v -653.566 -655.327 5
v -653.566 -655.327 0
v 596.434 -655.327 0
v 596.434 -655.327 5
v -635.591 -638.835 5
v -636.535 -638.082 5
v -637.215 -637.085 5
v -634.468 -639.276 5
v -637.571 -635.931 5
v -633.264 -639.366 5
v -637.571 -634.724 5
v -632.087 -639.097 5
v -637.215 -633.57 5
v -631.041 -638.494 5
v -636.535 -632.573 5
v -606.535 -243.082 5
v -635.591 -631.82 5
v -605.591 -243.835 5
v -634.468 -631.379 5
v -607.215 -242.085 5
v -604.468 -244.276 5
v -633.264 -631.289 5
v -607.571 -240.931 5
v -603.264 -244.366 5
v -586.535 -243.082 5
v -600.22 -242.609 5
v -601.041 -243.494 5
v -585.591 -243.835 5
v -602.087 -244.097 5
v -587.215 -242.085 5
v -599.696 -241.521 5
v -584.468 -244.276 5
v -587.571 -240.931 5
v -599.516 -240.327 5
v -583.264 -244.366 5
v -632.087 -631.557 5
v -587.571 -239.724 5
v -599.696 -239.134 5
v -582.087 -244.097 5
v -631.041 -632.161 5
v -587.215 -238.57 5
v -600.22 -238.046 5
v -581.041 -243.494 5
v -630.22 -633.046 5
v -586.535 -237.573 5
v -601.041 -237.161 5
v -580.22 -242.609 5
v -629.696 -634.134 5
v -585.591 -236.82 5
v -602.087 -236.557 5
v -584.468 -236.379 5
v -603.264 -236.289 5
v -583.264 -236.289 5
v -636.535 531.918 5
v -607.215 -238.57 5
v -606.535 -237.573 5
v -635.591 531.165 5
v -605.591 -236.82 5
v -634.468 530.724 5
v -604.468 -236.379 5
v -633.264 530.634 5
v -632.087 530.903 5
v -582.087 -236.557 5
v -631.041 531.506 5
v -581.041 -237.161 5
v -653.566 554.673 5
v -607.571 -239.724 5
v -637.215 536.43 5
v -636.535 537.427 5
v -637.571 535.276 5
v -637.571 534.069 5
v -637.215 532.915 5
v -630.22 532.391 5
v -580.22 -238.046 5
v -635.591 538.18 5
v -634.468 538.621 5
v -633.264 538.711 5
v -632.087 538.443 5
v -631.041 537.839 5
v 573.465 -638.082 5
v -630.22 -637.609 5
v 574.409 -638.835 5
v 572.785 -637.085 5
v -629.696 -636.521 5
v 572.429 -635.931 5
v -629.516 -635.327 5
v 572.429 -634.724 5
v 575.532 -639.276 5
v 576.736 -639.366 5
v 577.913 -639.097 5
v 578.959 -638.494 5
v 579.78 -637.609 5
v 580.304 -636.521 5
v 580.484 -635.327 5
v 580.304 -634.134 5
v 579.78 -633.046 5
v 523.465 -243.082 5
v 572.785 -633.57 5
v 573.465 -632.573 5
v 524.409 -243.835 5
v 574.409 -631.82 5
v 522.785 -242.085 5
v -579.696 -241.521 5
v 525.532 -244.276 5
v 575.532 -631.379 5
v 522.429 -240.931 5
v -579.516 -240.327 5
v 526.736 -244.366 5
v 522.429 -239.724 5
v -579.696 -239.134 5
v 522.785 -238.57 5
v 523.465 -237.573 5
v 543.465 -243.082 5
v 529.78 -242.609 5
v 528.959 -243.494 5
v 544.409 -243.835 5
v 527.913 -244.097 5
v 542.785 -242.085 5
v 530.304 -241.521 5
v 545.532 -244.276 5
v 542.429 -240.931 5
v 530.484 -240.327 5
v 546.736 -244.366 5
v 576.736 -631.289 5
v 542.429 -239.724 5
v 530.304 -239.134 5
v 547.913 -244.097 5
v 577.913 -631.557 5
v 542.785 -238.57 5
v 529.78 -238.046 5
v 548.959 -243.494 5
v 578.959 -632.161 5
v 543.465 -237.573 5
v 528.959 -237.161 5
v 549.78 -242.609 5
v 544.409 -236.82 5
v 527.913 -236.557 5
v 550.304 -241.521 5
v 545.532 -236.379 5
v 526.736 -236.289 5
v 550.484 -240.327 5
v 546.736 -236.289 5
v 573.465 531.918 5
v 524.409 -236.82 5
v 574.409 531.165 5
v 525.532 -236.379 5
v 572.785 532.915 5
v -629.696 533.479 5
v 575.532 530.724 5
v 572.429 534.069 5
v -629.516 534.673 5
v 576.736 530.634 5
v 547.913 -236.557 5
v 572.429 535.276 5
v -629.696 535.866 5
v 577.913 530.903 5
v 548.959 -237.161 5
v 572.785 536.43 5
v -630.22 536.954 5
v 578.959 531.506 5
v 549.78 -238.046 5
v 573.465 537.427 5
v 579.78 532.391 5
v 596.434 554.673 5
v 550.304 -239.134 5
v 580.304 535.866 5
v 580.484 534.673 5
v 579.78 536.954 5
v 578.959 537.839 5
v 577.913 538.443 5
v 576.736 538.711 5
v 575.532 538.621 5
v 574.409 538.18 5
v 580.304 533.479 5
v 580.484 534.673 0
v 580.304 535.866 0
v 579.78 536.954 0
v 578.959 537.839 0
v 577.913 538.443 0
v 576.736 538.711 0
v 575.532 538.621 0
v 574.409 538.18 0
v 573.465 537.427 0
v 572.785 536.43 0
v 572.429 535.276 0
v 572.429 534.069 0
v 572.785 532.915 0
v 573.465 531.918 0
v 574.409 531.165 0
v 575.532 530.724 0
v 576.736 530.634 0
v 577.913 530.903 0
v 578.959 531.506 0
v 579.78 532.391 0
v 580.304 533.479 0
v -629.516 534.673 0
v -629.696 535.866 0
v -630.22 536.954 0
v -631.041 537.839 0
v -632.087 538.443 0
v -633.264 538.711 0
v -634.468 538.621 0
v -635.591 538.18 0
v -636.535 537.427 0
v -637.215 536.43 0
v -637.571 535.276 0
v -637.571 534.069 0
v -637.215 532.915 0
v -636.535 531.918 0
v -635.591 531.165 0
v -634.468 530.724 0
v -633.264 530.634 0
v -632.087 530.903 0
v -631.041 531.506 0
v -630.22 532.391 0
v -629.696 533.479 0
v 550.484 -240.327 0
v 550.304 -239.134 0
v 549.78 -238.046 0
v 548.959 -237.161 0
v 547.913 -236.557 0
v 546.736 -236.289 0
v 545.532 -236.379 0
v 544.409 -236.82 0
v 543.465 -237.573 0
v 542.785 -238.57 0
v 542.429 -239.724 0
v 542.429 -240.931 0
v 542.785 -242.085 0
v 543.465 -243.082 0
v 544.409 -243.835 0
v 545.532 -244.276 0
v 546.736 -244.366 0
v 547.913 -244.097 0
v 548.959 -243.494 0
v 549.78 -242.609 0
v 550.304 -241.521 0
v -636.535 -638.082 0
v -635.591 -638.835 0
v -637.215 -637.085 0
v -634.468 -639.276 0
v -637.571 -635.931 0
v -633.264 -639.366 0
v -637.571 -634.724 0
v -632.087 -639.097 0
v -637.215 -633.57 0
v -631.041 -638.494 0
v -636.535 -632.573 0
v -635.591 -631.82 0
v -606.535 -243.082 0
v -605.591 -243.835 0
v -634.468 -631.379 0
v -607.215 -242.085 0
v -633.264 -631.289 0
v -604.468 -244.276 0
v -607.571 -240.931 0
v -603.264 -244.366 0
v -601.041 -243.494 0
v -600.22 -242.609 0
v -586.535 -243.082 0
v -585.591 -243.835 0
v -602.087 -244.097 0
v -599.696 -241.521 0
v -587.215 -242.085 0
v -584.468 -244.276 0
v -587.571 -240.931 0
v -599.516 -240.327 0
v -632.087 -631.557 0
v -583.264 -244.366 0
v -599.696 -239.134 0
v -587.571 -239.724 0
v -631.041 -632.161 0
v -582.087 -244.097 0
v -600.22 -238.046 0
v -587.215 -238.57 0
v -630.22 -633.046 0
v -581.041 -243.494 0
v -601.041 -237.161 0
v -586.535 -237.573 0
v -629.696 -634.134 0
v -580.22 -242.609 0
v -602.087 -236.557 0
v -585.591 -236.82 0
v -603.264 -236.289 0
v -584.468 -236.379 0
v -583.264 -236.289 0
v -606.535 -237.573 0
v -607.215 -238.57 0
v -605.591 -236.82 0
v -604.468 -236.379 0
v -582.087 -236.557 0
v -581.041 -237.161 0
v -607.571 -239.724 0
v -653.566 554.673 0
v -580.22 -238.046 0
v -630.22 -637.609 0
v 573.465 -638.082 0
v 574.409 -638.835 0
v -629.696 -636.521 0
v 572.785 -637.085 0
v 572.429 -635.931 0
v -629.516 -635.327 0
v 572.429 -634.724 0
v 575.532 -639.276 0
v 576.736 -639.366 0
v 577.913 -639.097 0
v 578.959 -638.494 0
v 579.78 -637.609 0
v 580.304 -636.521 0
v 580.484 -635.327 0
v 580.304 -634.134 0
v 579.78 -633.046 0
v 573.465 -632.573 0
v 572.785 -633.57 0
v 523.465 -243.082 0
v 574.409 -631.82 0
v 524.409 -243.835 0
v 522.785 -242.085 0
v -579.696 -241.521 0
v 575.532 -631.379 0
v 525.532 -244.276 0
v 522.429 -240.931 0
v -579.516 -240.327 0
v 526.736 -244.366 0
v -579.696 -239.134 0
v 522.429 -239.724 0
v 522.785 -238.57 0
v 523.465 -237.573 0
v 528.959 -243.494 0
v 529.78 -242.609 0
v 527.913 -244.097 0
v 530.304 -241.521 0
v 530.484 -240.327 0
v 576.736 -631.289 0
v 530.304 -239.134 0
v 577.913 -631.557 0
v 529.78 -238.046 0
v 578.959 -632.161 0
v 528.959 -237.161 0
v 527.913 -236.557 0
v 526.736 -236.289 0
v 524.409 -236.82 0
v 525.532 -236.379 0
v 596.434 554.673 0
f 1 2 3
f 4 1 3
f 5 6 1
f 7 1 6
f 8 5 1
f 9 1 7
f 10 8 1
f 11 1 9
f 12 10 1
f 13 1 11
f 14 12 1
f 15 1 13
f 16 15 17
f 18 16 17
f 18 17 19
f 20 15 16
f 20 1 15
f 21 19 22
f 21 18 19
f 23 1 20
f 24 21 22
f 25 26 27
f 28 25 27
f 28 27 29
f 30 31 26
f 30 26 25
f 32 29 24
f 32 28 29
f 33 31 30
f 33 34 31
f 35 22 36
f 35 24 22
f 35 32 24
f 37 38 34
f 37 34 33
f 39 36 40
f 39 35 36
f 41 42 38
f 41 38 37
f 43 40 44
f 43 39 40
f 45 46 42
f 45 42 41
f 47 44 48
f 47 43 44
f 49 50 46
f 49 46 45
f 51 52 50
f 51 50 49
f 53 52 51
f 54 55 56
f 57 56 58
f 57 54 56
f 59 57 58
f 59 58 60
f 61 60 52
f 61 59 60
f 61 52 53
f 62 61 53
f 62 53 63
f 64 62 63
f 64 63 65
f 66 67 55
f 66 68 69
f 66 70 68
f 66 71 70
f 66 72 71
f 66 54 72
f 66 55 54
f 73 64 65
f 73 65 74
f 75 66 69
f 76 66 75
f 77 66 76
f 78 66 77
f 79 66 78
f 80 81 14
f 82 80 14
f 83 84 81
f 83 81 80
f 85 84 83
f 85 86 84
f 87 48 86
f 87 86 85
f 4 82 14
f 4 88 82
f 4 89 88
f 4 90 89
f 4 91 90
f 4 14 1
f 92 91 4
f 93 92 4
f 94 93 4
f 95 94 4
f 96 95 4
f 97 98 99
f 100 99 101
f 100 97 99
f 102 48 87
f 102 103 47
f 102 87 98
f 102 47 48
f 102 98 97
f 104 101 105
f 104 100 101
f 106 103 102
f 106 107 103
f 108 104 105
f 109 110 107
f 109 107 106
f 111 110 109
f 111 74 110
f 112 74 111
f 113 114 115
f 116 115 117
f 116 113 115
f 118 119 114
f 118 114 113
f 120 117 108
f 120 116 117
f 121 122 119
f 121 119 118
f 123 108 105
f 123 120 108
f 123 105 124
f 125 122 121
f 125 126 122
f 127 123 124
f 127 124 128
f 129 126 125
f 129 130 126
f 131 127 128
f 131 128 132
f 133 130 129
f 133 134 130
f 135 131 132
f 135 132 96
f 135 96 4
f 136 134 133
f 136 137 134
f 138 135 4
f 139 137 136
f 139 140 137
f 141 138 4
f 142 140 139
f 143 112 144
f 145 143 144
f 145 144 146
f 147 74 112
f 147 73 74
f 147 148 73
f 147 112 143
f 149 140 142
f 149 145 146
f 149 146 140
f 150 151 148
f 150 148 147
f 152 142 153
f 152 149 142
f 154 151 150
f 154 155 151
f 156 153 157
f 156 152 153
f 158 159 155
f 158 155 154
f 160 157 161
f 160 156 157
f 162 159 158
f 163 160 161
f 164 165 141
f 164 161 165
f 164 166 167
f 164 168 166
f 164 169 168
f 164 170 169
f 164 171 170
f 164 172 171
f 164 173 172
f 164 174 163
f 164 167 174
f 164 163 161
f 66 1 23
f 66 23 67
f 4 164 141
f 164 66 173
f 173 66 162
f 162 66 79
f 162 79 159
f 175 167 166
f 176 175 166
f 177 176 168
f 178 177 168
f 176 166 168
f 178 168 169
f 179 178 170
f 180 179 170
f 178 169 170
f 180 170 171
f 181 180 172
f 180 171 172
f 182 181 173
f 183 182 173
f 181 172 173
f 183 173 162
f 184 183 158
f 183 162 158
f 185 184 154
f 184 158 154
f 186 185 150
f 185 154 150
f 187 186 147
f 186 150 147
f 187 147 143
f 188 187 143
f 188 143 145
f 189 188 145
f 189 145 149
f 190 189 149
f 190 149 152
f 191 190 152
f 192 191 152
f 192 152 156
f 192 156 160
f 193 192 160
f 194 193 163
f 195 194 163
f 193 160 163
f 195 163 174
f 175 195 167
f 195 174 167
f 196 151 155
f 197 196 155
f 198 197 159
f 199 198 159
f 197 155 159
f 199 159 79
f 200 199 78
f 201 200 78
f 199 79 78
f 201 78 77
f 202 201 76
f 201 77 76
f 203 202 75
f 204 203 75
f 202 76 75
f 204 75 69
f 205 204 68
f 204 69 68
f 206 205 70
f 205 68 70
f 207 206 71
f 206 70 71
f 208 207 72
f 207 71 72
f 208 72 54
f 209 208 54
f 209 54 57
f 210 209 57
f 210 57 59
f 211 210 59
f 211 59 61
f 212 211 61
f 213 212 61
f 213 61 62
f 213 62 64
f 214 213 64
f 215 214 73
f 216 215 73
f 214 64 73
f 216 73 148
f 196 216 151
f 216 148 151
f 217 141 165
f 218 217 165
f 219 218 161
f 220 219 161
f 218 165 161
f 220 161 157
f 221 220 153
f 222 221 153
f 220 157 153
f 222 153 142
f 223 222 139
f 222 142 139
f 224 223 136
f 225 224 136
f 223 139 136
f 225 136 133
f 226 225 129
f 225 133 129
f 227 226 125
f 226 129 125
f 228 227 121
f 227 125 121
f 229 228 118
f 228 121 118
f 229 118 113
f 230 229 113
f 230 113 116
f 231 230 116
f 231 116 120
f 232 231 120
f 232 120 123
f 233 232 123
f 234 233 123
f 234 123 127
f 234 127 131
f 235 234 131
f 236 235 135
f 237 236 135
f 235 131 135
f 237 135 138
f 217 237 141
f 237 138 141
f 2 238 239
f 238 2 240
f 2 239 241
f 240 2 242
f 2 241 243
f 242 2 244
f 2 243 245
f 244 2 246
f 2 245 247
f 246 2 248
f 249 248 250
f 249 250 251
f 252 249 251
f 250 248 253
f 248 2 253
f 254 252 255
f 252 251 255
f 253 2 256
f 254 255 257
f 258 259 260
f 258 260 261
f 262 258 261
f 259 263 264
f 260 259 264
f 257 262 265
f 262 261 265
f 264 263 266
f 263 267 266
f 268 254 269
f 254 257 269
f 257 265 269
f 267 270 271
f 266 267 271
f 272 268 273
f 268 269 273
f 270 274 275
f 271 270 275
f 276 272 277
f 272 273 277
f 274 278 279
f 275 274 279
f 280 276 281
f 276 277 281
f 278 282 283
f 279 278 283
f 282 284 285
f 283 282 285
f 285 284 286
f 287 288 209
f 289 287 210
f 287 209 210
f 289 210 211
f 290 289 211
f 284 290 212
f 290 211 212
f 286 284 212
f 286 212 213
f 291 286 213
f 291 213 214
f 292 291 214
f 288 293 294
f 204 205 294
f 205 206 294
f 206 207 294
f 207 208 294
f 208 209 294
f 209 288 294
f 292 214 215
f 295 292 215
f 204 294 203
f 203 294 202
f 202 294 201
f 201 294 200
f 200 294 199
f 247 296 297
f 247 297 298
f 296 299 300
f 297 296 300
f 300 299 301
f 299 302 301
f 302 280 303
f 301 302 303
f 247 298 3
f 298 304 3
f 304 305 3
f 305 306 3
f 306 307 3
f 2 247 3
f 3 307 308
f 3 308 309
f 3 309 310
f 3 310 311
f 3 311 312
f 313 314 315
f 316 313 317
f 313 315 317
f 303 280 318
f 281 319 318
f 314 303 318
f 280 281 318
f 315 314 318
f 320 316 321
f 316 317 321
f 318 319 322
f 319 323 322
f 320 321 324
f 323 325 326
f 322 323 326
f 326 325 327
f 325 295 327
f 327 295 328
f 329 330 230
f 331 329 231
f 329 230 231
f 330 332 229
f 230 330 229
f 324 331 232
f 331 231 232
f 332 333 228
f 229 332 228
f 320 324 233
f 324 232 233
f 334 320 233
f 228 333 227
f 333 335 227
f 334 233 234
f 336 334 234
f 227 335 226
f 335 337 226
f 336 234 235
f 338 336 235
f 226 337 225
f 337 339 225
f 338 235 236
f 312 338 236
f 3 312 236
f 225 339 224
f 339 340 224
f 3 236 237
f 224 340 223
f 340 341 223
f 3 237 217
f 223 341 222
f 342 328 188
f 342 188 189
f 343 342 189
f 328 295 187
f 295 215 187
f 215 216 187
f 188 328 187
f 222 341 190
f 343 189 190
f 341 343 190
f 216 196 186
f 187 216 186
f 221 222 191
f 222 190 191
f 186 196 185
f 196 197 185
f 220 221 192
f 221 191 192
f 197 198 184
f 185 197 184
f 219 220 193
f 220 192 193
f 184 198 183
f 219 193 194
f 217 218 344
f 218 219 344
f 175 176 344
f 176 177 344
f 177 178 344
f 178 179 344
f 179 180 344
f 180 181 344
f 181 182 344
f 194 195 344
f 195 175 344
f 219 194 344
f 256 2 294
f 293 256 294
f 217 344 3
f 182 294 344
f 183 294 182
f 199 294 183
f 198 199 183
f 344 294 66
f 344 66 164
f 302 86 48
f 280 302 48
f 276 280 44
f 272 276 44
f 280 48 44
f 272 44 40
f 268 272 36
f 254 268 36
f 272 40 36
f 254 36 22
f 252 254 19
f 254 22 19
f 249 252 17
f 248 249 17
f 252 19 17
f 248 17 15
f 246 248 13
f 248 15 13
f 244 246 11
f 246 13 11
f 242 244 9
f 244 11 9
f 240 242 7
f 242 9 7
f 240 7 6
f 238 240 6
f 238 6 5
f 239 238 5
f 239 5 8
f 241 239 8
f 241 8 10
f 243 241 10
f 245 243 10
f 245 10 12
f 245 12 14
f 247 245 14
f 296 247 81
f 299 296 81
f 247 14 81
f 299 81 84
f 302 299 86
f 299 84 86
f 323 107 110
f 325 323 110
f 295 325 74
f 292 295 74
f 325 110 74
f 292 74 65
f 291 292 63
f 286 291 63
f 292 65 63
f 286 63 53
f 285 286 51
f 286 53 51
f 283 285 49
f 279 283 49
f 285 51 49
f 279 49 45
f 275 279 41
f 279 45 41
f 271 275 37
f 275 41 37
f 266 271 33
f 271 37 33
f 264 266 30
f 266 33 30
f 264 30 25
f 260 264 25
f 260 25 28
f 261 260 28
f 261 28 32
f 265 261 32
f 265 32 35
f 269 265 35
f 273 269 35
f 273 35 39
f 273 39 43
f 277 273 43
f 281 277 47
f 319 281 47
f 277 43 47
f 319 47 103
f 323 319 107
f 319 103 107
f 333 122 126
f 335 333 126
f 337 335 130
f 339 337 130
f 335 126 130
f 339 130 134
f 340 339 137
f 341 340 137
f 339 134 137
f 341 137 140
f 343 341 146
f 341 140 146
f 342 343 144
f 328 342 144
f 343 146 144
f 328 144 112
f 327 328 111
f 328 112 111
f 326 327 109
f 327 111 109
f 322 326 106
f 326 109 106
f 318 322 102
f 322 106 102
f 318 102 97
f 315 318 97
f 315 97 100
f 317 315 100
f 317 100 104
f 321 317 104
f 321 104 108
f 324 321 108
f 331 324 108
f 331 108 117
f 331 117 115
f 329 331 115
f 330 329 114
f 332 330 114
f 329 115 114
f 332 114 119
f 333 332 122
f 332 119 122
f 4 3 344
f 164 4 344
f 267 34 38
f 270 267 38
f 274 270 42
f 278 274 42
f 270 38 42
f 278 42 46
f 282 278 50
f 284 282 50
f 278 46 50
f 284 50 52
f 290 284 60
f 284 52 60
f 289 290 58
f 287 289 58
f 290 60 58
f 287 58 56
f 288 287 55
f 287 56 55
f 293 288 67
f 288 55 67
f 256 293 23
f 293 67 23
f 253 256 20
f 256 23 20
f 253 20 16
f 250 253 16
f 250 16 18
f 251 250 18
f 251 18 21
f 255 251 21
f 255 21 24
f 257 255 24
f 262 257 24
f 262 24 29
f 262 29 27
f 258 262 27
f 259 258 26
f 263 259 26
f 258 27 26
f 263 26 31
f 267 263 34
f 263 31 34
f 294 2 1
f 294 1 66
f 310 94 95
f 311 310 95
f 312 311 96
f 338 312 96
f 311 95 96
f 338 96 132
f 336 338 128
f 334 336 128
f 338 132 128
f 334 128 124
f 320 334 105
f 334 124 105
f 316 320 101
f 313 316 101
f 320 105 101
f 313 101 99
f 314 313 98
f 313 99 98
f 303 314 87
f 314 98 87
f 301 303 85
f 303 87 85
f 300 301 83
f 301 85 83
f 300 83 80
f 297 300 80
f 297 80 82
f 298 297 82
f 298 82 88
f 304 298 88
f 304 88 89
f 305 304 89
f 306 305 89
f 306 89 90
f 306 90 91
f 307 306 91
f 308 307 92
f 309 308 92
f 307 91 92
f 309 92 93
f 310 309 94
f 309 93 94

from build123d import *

# Parameters (mm, degrees)
SKETCH_1_W          = 1250
SKETCH_1_H          = 1210
EXTRUDE_1_DEPTH     = 5
SKETCH_2_R          = 4.05
CUT_EXTRUDE_1_DEPTH = 5
SKETCH_3_R          = 4.05
CUT_EXTRUDE_2_DEPTH = 5


with BuildPart() as part:
    # 草图1 → 凸台-拉伸1 (new body)
    with BuildSketch(Plane.XY):
        with Locations((-28.566371681, -50.327433628)):
            Rectangle(SKETCH_1_W, SKETCH_1_H)
    extrude(amount=EXTRUDE_1_DEPTH)

    # 草图2 → 切除-拉伸1 (cut)
    with BuildSketch(Plane.XY.offset(5)):
        with Locations((-633.566371681, 534.672566372)):
            Circle(SKETCH_2_R)
        with Locations((576.433628319, 534.672566372)):
            Circle(SKETCH_2_R)
        with Locations((576.433628319, -635.327433628)):
            Circle(SKETCH_2_R)
        with Locations((-633.566371681, -635.327433628)):
            Circle(SKETCH_2_R)
    extrude(amount=-CUT_EXTRUDE_1_DEPTH, mode=Mode.SUBTRACT)

    # 草图3 → 切除-拉伸2 (cut)
    with BuildSketch(Plane.XY.offset(5)):
        with Locations((-603.566371681, -240.327433628)):
            Circle(SKETCH_3_R)
        with Locations((526.433628319, -240.327433628)):
            Circle(SKETCH_3_R)
        with Locations((-583.566371681, -240.327433628)):
            Circle(SKETCH_3_R)
        with Locations((546.433628319, -240.327433628)):
            Circle(SKETCH_3_R)
    extrude(amount=-CUT_EXTRUDE_2_DEPTH, mode=Mode.SUBTRACT)


solid = part.part
